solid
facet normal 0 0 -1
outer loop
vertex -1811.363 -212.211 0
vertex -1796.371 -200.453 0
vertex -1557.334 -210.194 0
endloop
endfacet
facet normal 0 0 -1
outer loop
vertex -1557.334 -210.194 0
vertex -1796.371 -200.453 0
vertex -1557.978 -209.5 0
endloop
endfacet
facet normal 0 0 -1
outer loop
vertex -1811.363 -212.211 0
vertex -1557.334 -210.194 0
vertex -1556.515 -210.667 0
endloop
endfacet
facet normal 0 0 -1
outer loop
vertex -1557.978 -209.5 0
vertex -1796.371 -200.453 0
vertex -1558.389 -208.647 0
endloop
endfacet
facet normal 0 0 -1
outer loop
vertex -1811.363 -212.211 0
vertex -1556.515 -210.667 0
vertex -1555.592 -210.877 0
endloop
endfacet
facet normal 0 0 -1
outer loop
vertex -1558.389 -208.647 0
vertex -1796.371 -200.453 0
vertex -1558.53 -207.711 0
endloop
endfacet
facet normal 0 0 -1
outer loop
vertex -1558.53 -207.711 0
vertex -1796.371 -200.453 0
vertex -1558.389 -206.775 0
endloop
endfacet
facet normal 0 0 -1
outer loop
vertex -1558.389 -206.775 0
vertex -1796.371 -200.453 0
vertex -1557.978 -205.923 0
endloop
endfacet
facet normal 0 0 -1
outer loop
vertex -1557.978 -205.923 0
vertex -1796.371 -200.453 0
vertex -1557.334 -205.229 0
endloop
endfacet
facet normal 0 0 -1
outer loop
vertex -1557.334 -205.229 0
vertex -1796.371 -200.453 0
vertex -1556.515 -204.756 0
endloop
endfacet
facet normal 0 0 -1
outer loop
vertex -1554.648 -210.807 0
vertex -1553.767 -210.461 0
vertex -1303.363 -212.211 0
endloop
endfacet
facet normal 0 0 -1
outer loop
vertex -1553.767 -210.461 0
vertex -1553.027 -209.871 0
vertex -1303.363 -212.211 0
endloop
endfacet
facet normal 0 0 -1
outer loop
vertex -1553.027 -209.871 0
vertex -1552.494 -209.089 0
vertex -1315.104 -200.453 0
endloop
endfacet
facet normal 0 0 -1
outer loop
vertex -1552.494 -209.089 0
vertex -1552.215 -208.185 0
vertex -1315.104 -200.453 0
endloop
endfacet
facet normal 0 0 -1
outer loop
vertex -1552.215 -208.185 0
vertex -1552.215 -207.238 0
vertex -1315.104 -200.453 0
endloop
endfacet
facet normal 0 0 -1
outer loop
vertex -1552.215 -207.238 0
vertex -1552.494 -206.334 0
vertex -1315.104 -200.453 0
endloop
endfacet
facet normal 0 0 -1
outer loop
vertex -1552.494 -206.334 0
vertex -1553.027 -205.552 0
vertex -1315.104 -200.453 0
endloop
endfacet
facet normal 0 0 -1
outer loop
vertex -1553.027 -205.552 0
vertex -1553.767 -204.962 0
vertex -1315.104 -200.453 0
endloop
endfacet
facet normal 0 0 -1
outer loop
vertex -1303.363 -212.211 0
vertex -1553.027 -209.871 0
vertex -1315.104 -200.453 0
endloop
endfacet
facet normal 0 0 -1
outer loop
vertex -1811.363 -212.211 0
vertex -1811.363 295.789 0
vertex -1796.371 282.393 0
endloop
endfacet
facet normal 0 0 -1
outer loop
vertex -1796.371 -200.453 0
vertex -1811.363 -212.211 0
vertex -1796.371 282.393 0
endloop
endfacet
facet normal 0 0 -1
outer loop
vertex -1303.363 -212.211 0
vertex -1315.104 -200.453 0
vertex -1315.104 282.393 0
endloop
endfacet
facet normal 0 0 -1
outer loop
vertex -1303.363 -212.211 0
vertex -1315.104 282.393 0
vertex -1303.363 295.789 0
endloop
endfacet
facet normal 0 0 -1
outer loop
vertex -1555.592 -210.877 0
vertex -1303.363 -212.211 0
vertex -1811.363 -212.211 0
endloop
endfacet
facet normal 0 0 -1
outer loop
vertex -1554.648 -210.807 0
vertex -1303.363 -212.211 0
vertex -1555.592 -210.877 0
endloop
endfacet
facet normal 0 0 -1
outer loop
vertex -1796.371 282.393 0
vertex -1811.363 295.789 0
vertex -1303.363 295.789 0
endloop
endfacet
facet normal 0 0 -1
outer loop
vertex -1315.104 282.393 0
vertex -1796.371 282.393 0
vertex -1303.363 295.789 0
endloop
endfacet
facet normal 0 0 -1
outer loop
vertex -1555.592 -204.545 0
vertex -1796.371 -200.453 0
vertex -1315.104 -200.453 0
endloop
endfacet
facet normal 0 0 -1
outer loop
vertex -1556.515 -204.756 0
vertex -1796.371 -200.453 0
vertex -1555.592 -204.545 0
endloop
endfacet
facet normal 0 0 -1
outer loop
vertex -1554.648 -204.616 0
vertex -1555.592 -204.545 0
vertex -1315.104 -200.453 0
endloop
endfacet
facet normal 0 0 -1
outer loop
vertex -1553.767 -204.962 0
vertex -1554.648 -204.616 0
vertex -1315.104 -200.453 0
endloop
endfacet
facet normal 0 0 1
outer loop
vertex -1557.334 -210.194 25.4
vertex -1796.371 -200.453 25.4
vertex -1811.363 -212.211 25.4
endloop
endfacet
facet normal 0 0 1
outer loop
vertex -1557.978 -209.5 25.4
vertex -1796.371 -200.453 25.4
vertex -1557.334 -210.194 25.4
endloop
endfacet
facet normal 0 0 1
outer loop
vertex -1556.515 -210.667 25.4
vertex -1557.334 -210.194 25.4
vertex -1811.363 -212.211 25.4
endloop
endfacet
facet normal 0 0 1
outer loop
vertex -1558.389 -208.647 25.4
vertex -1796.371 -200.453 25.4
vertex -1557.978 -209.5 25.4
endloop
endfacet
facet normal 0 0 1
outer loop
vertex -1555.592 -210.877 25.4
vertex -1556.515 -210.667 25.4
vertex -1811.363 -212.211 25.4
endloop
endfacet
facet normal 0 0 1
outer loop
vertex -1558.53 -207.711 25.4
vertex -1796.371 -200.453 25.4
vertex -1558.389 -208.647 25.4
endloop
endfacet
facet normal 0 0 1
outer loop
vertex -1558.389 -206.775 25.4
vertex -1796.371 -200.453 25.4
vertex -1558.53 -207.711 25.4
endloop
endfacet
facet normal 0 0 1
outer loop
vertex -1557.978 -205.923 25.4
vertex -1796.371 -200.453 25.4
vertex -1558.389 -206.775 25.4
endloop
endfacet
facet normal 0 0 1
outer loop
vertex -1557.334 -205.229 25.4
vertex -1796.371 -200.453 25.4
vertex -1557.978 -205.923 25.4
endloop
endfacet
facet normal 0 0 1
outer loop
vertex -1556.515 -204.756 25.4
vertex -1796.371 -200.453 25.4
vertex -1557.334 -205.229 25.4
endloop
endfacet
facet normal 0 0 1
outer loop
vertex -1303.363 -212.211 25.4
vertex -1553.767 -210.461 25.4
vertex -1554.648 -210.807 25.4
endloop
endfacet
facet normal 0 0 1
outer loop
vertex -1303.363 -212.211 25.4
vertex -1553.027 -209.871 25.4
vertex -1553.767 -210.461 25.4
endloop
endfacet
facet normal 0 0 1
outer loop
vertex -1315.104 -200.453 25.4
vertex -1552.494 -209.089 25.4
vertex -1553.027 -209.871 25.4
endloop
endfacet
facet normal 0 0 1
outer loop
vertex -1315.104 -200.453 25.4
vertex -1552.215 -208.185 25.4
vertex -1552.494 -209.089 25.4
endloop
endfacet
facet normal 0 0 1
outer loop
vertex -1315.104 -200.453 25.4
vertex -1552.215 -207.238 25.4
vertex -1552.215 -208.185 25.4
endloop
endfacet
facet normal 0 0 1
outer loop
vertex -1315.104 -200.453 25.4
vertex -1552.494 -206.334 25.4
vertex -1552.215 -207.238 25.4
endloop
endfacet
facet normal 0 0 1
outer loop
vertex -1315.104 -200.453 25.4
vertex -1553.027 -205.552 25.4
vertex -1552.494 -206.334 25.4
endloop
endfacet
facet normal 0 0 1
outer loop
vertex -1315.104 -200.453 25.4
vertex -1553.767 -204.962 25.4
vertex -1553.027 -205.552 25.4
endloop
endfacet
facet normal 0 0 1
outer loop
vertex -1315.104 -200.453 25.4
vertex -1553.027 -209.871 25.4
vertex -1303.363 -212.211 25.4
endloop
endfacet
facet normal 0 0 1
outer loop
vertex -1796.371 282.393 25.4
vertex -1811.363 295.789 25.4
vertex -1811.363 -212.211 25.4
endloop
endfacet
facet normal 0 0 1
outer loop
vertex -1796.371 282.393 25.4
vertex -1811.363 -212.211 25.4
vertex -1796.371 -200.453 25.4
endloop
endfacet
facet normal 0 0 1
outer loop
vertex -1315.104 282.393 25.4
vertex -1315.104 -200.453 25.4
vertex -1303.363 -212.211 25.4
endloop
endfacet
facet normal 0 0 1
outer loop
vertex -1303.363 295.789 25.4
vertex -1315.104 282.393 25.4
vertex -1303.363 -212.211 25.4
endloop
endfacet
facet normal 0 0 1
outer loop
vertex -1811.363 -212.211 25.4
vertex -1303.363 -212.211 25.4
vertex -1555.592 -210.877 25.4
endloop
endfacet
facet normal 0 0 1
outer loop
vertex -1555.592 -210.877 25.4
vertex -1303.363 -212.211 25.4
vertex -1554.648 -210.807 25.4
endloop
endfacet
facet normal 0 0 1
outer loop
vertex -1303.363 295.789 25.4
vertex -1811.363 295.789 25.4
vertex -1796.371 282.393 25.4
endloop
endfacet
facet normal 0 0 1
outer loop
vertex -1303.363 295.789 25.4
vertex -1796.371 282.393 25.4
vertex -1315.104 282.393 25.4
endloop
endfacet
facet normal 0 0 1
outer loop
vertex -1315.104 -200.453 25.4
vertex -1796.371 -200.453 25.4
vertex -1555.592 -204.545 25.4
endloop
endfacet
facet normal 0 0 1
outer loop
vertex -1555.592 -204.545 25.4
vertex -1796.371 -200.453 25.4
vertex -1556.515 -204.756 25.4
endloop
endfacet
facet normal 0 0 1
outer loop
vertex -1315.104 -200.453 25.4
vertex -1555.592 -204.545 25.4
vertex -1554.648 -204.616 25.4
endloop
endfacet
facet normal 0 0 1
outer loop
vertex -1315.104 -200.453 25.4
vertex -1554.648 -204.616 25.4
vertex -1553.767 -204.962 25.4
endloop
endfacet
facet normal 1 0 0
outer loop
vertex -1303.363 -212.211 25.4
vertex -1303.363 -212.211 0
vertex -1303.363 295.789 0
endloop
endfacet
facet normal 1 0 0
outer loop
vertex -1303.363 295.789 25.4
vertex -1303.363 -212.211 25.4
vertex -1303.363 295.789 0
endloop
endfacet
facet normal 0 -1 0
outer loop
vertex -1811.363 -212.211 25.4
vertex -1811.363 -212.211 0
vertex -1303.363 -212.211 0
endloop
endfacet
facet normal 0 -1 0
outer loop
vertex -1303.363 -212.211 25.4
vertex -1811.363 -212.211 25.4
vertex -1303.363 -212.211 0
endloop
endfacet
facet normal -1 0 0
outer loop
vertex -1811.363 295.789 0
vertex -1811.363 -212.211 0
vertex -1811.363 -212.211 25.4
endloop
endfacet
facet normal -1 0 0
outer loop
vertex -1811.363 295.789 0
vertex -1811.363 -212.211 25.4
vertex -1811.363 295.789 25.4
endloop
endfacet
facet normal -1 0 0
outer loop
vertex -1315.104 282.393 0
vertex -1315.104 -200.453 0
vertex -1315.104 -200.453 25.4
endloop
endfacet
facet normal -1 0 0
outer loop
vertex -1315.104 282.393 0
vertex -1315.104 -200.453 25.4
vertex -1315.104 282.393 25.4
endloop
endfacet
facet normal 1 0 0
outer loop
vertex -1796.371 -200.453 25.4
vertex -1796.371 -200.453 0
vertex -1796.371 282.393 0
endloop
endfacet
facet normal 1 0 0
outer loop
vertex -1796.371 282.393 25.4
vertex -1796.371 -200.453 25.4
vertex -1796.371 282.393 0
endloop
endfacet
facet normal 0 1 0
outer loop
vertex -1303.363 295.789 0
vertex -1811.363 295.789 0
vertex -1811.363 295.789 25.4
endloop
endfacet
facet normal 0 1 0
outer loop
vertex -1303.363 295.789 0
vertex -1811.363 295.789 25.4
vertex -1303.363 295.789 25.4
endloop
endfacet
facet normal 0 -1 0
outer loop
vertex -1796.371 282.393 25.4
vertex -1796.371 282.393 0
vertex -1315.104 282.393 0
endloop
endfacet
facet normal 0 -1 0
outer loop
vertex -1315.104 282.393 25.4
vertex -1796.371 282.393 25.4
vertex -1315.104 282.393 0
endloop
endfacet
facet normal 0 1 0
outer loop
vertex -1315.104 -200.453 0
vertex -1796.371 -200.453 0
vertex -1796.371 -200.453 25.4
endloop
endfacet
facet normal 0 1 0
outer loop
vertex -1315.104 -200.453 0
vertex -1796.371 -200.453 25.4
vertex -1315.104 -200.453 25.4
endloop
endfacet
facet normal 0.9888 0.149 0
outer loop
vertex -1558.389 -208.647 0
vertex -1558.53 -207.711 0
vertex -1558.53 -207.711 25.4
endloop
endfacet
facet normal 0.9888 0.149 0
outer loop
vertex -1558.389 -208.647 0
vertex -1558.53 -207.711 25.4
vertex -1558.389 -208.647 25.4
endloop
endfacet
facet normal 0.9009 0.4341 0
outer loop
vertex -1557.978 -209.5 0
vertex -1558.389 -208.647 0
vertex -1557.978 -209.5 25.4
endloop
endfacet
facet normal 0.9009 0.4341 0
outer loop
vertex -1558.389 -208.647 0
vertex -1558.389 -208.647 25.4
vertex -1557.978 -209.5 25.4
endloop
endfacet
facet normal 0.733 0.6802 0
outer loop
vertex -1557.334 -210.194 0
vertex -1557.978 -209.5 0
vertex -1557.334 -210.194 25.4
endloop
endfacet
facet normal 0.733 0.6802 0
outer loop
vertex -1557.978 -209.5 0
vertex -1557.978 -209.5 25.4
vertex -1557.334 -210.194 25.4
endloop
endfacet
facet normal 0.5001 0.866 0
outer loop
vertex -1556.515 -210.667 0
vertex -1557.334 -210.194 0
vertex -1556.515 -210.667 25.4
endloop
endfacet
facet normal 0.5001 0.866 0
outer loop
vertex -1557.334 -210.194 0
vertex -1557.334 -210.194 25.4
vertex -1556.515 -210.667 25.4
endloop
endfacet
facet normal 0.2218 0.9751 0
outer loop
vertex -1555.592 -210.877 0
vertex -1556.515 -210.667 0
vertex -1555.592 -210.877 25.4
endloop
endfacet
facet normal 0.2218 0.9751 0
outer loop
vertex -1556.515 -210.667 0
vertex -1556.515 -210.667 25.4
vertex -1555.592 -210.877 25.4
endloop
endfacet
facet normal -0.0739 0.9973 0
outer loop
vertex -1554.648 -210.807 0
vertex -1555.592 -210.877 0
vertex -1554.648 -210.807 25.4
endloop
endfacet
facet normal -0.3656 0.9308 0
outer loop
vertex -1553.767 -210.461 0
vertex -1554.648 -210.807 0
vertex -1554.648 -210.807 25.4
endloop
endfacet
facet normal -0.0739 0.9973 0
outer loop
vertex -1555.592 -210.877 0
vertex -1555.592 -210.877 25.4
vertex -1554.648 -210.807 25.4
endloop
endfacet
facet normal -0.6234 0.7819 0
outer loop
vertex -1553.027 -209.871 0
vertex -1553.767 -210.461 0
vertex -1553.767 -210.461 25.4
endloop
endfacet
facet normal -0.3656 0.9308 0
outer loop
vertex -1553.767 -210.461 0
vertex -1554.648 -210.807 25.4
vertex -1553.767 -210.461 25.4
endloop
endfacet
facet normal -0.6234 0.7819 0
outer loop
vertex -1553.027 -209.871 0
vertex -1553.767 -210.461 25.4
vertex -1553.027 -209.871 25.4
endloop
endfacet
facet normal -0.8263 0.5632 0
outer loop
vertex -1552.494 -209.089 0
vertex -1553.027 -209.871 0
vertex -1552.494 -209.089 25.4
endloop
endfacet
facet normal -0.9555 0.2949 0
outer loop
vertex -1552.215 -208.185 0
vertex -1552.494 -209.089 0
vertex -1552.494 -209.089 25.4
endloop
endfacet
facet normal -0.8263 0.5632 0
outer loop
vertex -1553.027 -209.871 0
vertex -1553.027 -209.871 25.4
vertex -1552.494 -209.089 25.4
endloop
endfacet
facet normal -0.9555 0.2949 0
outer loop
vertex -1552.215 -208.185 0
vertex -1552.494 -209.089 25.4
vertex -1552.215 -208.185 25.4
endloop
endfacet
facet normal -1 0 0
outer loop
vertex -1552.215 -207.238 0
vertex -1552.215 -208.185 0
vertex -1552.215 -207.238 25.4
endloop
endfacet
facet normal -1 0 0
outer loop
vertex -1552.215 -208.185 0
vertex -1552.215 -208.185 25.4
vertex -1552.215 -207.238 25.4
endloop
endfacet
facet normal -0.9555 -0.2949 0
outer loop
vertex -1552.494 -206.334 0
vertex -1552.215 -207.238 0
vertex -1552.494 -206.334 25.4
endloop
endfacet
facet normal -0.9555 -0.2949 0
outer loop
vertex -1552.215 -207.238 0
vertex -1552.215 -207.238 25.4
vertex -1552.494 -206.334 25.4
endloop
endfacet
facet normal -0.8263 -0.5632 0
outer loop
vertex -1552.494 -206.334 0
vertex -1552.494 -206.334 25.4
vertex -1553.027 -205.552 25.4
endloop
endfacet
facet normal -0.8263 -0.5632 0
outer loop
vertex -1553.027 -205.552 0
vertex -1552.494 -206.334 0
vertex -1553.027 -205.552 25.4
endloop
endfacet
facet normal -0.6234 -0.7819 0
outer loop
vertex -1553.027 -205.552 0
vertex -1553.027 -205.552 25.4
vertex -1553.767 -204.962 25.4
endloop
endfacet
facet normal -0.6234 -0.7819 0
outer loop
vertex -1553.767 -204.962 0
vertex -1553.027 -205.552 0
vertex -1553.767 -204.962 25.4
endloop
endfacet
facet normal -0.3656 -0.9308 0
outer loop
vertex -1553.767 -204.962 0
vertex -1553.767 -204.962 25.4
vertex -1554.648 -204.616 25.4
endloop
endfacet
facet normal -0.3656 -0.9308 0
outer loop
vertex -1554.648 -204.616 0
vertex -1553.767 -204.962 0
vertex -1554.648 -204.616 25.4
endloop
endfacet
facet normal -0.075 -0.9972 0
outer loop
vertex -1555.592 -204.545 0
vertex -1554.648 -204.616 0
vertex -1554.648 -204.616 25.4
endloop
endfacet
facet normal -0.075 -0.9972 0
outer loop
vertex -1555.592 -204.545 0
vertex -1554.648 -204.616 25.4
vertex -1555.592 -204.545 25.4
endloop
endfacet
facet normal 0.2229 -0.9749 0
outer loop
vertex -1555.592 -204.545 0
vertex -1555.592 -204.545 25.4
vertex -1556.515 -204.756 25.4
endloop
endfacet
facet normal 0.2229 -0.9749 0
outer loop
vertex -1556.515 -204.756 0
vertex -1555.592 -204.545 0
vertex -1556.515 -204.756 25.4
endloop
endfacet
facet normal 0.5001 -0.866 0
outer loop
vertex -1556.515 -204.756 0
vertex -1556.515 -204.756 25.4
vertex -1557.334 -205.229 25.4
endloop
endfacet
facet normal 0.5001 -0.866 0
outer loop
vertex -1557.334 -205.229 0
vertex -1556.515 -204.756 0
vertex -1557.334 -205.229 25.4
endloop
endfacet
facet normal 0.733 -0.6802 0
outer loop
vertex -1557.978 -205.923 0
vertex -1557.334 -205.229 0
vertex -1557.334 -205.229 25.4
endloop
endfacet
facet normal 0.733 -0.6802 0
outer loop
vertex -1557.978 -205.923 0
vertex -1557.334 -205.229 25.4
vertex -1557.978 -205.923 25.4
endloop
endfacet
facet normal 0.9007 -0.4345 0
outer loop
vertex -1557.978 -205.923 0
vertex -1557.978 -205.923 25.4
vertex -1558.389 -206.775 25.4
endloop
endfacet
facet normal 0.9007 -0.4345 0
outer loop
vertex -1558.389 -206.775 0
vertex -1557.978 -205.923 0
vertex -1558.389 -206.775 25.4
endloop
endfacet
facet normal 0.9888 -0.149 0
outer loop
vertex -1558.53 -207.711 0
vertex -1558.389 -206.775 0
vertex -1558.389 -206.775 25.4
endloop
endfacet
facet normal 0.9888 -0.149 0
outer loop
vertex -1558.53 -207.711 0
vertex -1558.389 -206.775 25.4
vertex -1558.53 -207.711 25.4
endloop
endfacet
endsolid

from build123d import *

# Parameters (mm, degrees)
F0_W     = 25.4
F0_H     = 254
F1_DEPTH = 5.08
F5_W     = 508
F5_H     = 508
F5_W_2   = 481.2670946121
F5_H_2   = 482.8459620476
F6_DEPTH = 25.4
F9_D     = 6.35


with BuildPart() as f1:
    # F0 (on Top) → F1 (new body)
    with BuildSketch(Plane.XY):
        with Locations((-293.8296190764, 14.3110007048)):
            Rectangle(F0_W, F0_H)
    extrude(amount=F1_DEPTH)


with BuildPart() as f6:
    # F5 (on face) → F6 (new body)
    with BuildSketch(Plane.XY):
        with Locations((-1557.362942471, 41.7894273996)):
            Rectangle(F5_W, F5_H)
        with Locations((-1555.7374358177, 40.9697592258)):
            Rectangle(F5_W_2, F5_H_2, mode=Mode.SUBTRACT)
    extrude(amount=F6_DEPTH)

    # F9 (through all)
    with Locations(Plane(origin=(0, 0, 0), x_dir=(1, 0, 0), z_dir=(0, 0, -1))):
        with Locations((-1555.3545951843, 207.7113389969)):
            Hole(F9_D / 2)


solid = f6.part
